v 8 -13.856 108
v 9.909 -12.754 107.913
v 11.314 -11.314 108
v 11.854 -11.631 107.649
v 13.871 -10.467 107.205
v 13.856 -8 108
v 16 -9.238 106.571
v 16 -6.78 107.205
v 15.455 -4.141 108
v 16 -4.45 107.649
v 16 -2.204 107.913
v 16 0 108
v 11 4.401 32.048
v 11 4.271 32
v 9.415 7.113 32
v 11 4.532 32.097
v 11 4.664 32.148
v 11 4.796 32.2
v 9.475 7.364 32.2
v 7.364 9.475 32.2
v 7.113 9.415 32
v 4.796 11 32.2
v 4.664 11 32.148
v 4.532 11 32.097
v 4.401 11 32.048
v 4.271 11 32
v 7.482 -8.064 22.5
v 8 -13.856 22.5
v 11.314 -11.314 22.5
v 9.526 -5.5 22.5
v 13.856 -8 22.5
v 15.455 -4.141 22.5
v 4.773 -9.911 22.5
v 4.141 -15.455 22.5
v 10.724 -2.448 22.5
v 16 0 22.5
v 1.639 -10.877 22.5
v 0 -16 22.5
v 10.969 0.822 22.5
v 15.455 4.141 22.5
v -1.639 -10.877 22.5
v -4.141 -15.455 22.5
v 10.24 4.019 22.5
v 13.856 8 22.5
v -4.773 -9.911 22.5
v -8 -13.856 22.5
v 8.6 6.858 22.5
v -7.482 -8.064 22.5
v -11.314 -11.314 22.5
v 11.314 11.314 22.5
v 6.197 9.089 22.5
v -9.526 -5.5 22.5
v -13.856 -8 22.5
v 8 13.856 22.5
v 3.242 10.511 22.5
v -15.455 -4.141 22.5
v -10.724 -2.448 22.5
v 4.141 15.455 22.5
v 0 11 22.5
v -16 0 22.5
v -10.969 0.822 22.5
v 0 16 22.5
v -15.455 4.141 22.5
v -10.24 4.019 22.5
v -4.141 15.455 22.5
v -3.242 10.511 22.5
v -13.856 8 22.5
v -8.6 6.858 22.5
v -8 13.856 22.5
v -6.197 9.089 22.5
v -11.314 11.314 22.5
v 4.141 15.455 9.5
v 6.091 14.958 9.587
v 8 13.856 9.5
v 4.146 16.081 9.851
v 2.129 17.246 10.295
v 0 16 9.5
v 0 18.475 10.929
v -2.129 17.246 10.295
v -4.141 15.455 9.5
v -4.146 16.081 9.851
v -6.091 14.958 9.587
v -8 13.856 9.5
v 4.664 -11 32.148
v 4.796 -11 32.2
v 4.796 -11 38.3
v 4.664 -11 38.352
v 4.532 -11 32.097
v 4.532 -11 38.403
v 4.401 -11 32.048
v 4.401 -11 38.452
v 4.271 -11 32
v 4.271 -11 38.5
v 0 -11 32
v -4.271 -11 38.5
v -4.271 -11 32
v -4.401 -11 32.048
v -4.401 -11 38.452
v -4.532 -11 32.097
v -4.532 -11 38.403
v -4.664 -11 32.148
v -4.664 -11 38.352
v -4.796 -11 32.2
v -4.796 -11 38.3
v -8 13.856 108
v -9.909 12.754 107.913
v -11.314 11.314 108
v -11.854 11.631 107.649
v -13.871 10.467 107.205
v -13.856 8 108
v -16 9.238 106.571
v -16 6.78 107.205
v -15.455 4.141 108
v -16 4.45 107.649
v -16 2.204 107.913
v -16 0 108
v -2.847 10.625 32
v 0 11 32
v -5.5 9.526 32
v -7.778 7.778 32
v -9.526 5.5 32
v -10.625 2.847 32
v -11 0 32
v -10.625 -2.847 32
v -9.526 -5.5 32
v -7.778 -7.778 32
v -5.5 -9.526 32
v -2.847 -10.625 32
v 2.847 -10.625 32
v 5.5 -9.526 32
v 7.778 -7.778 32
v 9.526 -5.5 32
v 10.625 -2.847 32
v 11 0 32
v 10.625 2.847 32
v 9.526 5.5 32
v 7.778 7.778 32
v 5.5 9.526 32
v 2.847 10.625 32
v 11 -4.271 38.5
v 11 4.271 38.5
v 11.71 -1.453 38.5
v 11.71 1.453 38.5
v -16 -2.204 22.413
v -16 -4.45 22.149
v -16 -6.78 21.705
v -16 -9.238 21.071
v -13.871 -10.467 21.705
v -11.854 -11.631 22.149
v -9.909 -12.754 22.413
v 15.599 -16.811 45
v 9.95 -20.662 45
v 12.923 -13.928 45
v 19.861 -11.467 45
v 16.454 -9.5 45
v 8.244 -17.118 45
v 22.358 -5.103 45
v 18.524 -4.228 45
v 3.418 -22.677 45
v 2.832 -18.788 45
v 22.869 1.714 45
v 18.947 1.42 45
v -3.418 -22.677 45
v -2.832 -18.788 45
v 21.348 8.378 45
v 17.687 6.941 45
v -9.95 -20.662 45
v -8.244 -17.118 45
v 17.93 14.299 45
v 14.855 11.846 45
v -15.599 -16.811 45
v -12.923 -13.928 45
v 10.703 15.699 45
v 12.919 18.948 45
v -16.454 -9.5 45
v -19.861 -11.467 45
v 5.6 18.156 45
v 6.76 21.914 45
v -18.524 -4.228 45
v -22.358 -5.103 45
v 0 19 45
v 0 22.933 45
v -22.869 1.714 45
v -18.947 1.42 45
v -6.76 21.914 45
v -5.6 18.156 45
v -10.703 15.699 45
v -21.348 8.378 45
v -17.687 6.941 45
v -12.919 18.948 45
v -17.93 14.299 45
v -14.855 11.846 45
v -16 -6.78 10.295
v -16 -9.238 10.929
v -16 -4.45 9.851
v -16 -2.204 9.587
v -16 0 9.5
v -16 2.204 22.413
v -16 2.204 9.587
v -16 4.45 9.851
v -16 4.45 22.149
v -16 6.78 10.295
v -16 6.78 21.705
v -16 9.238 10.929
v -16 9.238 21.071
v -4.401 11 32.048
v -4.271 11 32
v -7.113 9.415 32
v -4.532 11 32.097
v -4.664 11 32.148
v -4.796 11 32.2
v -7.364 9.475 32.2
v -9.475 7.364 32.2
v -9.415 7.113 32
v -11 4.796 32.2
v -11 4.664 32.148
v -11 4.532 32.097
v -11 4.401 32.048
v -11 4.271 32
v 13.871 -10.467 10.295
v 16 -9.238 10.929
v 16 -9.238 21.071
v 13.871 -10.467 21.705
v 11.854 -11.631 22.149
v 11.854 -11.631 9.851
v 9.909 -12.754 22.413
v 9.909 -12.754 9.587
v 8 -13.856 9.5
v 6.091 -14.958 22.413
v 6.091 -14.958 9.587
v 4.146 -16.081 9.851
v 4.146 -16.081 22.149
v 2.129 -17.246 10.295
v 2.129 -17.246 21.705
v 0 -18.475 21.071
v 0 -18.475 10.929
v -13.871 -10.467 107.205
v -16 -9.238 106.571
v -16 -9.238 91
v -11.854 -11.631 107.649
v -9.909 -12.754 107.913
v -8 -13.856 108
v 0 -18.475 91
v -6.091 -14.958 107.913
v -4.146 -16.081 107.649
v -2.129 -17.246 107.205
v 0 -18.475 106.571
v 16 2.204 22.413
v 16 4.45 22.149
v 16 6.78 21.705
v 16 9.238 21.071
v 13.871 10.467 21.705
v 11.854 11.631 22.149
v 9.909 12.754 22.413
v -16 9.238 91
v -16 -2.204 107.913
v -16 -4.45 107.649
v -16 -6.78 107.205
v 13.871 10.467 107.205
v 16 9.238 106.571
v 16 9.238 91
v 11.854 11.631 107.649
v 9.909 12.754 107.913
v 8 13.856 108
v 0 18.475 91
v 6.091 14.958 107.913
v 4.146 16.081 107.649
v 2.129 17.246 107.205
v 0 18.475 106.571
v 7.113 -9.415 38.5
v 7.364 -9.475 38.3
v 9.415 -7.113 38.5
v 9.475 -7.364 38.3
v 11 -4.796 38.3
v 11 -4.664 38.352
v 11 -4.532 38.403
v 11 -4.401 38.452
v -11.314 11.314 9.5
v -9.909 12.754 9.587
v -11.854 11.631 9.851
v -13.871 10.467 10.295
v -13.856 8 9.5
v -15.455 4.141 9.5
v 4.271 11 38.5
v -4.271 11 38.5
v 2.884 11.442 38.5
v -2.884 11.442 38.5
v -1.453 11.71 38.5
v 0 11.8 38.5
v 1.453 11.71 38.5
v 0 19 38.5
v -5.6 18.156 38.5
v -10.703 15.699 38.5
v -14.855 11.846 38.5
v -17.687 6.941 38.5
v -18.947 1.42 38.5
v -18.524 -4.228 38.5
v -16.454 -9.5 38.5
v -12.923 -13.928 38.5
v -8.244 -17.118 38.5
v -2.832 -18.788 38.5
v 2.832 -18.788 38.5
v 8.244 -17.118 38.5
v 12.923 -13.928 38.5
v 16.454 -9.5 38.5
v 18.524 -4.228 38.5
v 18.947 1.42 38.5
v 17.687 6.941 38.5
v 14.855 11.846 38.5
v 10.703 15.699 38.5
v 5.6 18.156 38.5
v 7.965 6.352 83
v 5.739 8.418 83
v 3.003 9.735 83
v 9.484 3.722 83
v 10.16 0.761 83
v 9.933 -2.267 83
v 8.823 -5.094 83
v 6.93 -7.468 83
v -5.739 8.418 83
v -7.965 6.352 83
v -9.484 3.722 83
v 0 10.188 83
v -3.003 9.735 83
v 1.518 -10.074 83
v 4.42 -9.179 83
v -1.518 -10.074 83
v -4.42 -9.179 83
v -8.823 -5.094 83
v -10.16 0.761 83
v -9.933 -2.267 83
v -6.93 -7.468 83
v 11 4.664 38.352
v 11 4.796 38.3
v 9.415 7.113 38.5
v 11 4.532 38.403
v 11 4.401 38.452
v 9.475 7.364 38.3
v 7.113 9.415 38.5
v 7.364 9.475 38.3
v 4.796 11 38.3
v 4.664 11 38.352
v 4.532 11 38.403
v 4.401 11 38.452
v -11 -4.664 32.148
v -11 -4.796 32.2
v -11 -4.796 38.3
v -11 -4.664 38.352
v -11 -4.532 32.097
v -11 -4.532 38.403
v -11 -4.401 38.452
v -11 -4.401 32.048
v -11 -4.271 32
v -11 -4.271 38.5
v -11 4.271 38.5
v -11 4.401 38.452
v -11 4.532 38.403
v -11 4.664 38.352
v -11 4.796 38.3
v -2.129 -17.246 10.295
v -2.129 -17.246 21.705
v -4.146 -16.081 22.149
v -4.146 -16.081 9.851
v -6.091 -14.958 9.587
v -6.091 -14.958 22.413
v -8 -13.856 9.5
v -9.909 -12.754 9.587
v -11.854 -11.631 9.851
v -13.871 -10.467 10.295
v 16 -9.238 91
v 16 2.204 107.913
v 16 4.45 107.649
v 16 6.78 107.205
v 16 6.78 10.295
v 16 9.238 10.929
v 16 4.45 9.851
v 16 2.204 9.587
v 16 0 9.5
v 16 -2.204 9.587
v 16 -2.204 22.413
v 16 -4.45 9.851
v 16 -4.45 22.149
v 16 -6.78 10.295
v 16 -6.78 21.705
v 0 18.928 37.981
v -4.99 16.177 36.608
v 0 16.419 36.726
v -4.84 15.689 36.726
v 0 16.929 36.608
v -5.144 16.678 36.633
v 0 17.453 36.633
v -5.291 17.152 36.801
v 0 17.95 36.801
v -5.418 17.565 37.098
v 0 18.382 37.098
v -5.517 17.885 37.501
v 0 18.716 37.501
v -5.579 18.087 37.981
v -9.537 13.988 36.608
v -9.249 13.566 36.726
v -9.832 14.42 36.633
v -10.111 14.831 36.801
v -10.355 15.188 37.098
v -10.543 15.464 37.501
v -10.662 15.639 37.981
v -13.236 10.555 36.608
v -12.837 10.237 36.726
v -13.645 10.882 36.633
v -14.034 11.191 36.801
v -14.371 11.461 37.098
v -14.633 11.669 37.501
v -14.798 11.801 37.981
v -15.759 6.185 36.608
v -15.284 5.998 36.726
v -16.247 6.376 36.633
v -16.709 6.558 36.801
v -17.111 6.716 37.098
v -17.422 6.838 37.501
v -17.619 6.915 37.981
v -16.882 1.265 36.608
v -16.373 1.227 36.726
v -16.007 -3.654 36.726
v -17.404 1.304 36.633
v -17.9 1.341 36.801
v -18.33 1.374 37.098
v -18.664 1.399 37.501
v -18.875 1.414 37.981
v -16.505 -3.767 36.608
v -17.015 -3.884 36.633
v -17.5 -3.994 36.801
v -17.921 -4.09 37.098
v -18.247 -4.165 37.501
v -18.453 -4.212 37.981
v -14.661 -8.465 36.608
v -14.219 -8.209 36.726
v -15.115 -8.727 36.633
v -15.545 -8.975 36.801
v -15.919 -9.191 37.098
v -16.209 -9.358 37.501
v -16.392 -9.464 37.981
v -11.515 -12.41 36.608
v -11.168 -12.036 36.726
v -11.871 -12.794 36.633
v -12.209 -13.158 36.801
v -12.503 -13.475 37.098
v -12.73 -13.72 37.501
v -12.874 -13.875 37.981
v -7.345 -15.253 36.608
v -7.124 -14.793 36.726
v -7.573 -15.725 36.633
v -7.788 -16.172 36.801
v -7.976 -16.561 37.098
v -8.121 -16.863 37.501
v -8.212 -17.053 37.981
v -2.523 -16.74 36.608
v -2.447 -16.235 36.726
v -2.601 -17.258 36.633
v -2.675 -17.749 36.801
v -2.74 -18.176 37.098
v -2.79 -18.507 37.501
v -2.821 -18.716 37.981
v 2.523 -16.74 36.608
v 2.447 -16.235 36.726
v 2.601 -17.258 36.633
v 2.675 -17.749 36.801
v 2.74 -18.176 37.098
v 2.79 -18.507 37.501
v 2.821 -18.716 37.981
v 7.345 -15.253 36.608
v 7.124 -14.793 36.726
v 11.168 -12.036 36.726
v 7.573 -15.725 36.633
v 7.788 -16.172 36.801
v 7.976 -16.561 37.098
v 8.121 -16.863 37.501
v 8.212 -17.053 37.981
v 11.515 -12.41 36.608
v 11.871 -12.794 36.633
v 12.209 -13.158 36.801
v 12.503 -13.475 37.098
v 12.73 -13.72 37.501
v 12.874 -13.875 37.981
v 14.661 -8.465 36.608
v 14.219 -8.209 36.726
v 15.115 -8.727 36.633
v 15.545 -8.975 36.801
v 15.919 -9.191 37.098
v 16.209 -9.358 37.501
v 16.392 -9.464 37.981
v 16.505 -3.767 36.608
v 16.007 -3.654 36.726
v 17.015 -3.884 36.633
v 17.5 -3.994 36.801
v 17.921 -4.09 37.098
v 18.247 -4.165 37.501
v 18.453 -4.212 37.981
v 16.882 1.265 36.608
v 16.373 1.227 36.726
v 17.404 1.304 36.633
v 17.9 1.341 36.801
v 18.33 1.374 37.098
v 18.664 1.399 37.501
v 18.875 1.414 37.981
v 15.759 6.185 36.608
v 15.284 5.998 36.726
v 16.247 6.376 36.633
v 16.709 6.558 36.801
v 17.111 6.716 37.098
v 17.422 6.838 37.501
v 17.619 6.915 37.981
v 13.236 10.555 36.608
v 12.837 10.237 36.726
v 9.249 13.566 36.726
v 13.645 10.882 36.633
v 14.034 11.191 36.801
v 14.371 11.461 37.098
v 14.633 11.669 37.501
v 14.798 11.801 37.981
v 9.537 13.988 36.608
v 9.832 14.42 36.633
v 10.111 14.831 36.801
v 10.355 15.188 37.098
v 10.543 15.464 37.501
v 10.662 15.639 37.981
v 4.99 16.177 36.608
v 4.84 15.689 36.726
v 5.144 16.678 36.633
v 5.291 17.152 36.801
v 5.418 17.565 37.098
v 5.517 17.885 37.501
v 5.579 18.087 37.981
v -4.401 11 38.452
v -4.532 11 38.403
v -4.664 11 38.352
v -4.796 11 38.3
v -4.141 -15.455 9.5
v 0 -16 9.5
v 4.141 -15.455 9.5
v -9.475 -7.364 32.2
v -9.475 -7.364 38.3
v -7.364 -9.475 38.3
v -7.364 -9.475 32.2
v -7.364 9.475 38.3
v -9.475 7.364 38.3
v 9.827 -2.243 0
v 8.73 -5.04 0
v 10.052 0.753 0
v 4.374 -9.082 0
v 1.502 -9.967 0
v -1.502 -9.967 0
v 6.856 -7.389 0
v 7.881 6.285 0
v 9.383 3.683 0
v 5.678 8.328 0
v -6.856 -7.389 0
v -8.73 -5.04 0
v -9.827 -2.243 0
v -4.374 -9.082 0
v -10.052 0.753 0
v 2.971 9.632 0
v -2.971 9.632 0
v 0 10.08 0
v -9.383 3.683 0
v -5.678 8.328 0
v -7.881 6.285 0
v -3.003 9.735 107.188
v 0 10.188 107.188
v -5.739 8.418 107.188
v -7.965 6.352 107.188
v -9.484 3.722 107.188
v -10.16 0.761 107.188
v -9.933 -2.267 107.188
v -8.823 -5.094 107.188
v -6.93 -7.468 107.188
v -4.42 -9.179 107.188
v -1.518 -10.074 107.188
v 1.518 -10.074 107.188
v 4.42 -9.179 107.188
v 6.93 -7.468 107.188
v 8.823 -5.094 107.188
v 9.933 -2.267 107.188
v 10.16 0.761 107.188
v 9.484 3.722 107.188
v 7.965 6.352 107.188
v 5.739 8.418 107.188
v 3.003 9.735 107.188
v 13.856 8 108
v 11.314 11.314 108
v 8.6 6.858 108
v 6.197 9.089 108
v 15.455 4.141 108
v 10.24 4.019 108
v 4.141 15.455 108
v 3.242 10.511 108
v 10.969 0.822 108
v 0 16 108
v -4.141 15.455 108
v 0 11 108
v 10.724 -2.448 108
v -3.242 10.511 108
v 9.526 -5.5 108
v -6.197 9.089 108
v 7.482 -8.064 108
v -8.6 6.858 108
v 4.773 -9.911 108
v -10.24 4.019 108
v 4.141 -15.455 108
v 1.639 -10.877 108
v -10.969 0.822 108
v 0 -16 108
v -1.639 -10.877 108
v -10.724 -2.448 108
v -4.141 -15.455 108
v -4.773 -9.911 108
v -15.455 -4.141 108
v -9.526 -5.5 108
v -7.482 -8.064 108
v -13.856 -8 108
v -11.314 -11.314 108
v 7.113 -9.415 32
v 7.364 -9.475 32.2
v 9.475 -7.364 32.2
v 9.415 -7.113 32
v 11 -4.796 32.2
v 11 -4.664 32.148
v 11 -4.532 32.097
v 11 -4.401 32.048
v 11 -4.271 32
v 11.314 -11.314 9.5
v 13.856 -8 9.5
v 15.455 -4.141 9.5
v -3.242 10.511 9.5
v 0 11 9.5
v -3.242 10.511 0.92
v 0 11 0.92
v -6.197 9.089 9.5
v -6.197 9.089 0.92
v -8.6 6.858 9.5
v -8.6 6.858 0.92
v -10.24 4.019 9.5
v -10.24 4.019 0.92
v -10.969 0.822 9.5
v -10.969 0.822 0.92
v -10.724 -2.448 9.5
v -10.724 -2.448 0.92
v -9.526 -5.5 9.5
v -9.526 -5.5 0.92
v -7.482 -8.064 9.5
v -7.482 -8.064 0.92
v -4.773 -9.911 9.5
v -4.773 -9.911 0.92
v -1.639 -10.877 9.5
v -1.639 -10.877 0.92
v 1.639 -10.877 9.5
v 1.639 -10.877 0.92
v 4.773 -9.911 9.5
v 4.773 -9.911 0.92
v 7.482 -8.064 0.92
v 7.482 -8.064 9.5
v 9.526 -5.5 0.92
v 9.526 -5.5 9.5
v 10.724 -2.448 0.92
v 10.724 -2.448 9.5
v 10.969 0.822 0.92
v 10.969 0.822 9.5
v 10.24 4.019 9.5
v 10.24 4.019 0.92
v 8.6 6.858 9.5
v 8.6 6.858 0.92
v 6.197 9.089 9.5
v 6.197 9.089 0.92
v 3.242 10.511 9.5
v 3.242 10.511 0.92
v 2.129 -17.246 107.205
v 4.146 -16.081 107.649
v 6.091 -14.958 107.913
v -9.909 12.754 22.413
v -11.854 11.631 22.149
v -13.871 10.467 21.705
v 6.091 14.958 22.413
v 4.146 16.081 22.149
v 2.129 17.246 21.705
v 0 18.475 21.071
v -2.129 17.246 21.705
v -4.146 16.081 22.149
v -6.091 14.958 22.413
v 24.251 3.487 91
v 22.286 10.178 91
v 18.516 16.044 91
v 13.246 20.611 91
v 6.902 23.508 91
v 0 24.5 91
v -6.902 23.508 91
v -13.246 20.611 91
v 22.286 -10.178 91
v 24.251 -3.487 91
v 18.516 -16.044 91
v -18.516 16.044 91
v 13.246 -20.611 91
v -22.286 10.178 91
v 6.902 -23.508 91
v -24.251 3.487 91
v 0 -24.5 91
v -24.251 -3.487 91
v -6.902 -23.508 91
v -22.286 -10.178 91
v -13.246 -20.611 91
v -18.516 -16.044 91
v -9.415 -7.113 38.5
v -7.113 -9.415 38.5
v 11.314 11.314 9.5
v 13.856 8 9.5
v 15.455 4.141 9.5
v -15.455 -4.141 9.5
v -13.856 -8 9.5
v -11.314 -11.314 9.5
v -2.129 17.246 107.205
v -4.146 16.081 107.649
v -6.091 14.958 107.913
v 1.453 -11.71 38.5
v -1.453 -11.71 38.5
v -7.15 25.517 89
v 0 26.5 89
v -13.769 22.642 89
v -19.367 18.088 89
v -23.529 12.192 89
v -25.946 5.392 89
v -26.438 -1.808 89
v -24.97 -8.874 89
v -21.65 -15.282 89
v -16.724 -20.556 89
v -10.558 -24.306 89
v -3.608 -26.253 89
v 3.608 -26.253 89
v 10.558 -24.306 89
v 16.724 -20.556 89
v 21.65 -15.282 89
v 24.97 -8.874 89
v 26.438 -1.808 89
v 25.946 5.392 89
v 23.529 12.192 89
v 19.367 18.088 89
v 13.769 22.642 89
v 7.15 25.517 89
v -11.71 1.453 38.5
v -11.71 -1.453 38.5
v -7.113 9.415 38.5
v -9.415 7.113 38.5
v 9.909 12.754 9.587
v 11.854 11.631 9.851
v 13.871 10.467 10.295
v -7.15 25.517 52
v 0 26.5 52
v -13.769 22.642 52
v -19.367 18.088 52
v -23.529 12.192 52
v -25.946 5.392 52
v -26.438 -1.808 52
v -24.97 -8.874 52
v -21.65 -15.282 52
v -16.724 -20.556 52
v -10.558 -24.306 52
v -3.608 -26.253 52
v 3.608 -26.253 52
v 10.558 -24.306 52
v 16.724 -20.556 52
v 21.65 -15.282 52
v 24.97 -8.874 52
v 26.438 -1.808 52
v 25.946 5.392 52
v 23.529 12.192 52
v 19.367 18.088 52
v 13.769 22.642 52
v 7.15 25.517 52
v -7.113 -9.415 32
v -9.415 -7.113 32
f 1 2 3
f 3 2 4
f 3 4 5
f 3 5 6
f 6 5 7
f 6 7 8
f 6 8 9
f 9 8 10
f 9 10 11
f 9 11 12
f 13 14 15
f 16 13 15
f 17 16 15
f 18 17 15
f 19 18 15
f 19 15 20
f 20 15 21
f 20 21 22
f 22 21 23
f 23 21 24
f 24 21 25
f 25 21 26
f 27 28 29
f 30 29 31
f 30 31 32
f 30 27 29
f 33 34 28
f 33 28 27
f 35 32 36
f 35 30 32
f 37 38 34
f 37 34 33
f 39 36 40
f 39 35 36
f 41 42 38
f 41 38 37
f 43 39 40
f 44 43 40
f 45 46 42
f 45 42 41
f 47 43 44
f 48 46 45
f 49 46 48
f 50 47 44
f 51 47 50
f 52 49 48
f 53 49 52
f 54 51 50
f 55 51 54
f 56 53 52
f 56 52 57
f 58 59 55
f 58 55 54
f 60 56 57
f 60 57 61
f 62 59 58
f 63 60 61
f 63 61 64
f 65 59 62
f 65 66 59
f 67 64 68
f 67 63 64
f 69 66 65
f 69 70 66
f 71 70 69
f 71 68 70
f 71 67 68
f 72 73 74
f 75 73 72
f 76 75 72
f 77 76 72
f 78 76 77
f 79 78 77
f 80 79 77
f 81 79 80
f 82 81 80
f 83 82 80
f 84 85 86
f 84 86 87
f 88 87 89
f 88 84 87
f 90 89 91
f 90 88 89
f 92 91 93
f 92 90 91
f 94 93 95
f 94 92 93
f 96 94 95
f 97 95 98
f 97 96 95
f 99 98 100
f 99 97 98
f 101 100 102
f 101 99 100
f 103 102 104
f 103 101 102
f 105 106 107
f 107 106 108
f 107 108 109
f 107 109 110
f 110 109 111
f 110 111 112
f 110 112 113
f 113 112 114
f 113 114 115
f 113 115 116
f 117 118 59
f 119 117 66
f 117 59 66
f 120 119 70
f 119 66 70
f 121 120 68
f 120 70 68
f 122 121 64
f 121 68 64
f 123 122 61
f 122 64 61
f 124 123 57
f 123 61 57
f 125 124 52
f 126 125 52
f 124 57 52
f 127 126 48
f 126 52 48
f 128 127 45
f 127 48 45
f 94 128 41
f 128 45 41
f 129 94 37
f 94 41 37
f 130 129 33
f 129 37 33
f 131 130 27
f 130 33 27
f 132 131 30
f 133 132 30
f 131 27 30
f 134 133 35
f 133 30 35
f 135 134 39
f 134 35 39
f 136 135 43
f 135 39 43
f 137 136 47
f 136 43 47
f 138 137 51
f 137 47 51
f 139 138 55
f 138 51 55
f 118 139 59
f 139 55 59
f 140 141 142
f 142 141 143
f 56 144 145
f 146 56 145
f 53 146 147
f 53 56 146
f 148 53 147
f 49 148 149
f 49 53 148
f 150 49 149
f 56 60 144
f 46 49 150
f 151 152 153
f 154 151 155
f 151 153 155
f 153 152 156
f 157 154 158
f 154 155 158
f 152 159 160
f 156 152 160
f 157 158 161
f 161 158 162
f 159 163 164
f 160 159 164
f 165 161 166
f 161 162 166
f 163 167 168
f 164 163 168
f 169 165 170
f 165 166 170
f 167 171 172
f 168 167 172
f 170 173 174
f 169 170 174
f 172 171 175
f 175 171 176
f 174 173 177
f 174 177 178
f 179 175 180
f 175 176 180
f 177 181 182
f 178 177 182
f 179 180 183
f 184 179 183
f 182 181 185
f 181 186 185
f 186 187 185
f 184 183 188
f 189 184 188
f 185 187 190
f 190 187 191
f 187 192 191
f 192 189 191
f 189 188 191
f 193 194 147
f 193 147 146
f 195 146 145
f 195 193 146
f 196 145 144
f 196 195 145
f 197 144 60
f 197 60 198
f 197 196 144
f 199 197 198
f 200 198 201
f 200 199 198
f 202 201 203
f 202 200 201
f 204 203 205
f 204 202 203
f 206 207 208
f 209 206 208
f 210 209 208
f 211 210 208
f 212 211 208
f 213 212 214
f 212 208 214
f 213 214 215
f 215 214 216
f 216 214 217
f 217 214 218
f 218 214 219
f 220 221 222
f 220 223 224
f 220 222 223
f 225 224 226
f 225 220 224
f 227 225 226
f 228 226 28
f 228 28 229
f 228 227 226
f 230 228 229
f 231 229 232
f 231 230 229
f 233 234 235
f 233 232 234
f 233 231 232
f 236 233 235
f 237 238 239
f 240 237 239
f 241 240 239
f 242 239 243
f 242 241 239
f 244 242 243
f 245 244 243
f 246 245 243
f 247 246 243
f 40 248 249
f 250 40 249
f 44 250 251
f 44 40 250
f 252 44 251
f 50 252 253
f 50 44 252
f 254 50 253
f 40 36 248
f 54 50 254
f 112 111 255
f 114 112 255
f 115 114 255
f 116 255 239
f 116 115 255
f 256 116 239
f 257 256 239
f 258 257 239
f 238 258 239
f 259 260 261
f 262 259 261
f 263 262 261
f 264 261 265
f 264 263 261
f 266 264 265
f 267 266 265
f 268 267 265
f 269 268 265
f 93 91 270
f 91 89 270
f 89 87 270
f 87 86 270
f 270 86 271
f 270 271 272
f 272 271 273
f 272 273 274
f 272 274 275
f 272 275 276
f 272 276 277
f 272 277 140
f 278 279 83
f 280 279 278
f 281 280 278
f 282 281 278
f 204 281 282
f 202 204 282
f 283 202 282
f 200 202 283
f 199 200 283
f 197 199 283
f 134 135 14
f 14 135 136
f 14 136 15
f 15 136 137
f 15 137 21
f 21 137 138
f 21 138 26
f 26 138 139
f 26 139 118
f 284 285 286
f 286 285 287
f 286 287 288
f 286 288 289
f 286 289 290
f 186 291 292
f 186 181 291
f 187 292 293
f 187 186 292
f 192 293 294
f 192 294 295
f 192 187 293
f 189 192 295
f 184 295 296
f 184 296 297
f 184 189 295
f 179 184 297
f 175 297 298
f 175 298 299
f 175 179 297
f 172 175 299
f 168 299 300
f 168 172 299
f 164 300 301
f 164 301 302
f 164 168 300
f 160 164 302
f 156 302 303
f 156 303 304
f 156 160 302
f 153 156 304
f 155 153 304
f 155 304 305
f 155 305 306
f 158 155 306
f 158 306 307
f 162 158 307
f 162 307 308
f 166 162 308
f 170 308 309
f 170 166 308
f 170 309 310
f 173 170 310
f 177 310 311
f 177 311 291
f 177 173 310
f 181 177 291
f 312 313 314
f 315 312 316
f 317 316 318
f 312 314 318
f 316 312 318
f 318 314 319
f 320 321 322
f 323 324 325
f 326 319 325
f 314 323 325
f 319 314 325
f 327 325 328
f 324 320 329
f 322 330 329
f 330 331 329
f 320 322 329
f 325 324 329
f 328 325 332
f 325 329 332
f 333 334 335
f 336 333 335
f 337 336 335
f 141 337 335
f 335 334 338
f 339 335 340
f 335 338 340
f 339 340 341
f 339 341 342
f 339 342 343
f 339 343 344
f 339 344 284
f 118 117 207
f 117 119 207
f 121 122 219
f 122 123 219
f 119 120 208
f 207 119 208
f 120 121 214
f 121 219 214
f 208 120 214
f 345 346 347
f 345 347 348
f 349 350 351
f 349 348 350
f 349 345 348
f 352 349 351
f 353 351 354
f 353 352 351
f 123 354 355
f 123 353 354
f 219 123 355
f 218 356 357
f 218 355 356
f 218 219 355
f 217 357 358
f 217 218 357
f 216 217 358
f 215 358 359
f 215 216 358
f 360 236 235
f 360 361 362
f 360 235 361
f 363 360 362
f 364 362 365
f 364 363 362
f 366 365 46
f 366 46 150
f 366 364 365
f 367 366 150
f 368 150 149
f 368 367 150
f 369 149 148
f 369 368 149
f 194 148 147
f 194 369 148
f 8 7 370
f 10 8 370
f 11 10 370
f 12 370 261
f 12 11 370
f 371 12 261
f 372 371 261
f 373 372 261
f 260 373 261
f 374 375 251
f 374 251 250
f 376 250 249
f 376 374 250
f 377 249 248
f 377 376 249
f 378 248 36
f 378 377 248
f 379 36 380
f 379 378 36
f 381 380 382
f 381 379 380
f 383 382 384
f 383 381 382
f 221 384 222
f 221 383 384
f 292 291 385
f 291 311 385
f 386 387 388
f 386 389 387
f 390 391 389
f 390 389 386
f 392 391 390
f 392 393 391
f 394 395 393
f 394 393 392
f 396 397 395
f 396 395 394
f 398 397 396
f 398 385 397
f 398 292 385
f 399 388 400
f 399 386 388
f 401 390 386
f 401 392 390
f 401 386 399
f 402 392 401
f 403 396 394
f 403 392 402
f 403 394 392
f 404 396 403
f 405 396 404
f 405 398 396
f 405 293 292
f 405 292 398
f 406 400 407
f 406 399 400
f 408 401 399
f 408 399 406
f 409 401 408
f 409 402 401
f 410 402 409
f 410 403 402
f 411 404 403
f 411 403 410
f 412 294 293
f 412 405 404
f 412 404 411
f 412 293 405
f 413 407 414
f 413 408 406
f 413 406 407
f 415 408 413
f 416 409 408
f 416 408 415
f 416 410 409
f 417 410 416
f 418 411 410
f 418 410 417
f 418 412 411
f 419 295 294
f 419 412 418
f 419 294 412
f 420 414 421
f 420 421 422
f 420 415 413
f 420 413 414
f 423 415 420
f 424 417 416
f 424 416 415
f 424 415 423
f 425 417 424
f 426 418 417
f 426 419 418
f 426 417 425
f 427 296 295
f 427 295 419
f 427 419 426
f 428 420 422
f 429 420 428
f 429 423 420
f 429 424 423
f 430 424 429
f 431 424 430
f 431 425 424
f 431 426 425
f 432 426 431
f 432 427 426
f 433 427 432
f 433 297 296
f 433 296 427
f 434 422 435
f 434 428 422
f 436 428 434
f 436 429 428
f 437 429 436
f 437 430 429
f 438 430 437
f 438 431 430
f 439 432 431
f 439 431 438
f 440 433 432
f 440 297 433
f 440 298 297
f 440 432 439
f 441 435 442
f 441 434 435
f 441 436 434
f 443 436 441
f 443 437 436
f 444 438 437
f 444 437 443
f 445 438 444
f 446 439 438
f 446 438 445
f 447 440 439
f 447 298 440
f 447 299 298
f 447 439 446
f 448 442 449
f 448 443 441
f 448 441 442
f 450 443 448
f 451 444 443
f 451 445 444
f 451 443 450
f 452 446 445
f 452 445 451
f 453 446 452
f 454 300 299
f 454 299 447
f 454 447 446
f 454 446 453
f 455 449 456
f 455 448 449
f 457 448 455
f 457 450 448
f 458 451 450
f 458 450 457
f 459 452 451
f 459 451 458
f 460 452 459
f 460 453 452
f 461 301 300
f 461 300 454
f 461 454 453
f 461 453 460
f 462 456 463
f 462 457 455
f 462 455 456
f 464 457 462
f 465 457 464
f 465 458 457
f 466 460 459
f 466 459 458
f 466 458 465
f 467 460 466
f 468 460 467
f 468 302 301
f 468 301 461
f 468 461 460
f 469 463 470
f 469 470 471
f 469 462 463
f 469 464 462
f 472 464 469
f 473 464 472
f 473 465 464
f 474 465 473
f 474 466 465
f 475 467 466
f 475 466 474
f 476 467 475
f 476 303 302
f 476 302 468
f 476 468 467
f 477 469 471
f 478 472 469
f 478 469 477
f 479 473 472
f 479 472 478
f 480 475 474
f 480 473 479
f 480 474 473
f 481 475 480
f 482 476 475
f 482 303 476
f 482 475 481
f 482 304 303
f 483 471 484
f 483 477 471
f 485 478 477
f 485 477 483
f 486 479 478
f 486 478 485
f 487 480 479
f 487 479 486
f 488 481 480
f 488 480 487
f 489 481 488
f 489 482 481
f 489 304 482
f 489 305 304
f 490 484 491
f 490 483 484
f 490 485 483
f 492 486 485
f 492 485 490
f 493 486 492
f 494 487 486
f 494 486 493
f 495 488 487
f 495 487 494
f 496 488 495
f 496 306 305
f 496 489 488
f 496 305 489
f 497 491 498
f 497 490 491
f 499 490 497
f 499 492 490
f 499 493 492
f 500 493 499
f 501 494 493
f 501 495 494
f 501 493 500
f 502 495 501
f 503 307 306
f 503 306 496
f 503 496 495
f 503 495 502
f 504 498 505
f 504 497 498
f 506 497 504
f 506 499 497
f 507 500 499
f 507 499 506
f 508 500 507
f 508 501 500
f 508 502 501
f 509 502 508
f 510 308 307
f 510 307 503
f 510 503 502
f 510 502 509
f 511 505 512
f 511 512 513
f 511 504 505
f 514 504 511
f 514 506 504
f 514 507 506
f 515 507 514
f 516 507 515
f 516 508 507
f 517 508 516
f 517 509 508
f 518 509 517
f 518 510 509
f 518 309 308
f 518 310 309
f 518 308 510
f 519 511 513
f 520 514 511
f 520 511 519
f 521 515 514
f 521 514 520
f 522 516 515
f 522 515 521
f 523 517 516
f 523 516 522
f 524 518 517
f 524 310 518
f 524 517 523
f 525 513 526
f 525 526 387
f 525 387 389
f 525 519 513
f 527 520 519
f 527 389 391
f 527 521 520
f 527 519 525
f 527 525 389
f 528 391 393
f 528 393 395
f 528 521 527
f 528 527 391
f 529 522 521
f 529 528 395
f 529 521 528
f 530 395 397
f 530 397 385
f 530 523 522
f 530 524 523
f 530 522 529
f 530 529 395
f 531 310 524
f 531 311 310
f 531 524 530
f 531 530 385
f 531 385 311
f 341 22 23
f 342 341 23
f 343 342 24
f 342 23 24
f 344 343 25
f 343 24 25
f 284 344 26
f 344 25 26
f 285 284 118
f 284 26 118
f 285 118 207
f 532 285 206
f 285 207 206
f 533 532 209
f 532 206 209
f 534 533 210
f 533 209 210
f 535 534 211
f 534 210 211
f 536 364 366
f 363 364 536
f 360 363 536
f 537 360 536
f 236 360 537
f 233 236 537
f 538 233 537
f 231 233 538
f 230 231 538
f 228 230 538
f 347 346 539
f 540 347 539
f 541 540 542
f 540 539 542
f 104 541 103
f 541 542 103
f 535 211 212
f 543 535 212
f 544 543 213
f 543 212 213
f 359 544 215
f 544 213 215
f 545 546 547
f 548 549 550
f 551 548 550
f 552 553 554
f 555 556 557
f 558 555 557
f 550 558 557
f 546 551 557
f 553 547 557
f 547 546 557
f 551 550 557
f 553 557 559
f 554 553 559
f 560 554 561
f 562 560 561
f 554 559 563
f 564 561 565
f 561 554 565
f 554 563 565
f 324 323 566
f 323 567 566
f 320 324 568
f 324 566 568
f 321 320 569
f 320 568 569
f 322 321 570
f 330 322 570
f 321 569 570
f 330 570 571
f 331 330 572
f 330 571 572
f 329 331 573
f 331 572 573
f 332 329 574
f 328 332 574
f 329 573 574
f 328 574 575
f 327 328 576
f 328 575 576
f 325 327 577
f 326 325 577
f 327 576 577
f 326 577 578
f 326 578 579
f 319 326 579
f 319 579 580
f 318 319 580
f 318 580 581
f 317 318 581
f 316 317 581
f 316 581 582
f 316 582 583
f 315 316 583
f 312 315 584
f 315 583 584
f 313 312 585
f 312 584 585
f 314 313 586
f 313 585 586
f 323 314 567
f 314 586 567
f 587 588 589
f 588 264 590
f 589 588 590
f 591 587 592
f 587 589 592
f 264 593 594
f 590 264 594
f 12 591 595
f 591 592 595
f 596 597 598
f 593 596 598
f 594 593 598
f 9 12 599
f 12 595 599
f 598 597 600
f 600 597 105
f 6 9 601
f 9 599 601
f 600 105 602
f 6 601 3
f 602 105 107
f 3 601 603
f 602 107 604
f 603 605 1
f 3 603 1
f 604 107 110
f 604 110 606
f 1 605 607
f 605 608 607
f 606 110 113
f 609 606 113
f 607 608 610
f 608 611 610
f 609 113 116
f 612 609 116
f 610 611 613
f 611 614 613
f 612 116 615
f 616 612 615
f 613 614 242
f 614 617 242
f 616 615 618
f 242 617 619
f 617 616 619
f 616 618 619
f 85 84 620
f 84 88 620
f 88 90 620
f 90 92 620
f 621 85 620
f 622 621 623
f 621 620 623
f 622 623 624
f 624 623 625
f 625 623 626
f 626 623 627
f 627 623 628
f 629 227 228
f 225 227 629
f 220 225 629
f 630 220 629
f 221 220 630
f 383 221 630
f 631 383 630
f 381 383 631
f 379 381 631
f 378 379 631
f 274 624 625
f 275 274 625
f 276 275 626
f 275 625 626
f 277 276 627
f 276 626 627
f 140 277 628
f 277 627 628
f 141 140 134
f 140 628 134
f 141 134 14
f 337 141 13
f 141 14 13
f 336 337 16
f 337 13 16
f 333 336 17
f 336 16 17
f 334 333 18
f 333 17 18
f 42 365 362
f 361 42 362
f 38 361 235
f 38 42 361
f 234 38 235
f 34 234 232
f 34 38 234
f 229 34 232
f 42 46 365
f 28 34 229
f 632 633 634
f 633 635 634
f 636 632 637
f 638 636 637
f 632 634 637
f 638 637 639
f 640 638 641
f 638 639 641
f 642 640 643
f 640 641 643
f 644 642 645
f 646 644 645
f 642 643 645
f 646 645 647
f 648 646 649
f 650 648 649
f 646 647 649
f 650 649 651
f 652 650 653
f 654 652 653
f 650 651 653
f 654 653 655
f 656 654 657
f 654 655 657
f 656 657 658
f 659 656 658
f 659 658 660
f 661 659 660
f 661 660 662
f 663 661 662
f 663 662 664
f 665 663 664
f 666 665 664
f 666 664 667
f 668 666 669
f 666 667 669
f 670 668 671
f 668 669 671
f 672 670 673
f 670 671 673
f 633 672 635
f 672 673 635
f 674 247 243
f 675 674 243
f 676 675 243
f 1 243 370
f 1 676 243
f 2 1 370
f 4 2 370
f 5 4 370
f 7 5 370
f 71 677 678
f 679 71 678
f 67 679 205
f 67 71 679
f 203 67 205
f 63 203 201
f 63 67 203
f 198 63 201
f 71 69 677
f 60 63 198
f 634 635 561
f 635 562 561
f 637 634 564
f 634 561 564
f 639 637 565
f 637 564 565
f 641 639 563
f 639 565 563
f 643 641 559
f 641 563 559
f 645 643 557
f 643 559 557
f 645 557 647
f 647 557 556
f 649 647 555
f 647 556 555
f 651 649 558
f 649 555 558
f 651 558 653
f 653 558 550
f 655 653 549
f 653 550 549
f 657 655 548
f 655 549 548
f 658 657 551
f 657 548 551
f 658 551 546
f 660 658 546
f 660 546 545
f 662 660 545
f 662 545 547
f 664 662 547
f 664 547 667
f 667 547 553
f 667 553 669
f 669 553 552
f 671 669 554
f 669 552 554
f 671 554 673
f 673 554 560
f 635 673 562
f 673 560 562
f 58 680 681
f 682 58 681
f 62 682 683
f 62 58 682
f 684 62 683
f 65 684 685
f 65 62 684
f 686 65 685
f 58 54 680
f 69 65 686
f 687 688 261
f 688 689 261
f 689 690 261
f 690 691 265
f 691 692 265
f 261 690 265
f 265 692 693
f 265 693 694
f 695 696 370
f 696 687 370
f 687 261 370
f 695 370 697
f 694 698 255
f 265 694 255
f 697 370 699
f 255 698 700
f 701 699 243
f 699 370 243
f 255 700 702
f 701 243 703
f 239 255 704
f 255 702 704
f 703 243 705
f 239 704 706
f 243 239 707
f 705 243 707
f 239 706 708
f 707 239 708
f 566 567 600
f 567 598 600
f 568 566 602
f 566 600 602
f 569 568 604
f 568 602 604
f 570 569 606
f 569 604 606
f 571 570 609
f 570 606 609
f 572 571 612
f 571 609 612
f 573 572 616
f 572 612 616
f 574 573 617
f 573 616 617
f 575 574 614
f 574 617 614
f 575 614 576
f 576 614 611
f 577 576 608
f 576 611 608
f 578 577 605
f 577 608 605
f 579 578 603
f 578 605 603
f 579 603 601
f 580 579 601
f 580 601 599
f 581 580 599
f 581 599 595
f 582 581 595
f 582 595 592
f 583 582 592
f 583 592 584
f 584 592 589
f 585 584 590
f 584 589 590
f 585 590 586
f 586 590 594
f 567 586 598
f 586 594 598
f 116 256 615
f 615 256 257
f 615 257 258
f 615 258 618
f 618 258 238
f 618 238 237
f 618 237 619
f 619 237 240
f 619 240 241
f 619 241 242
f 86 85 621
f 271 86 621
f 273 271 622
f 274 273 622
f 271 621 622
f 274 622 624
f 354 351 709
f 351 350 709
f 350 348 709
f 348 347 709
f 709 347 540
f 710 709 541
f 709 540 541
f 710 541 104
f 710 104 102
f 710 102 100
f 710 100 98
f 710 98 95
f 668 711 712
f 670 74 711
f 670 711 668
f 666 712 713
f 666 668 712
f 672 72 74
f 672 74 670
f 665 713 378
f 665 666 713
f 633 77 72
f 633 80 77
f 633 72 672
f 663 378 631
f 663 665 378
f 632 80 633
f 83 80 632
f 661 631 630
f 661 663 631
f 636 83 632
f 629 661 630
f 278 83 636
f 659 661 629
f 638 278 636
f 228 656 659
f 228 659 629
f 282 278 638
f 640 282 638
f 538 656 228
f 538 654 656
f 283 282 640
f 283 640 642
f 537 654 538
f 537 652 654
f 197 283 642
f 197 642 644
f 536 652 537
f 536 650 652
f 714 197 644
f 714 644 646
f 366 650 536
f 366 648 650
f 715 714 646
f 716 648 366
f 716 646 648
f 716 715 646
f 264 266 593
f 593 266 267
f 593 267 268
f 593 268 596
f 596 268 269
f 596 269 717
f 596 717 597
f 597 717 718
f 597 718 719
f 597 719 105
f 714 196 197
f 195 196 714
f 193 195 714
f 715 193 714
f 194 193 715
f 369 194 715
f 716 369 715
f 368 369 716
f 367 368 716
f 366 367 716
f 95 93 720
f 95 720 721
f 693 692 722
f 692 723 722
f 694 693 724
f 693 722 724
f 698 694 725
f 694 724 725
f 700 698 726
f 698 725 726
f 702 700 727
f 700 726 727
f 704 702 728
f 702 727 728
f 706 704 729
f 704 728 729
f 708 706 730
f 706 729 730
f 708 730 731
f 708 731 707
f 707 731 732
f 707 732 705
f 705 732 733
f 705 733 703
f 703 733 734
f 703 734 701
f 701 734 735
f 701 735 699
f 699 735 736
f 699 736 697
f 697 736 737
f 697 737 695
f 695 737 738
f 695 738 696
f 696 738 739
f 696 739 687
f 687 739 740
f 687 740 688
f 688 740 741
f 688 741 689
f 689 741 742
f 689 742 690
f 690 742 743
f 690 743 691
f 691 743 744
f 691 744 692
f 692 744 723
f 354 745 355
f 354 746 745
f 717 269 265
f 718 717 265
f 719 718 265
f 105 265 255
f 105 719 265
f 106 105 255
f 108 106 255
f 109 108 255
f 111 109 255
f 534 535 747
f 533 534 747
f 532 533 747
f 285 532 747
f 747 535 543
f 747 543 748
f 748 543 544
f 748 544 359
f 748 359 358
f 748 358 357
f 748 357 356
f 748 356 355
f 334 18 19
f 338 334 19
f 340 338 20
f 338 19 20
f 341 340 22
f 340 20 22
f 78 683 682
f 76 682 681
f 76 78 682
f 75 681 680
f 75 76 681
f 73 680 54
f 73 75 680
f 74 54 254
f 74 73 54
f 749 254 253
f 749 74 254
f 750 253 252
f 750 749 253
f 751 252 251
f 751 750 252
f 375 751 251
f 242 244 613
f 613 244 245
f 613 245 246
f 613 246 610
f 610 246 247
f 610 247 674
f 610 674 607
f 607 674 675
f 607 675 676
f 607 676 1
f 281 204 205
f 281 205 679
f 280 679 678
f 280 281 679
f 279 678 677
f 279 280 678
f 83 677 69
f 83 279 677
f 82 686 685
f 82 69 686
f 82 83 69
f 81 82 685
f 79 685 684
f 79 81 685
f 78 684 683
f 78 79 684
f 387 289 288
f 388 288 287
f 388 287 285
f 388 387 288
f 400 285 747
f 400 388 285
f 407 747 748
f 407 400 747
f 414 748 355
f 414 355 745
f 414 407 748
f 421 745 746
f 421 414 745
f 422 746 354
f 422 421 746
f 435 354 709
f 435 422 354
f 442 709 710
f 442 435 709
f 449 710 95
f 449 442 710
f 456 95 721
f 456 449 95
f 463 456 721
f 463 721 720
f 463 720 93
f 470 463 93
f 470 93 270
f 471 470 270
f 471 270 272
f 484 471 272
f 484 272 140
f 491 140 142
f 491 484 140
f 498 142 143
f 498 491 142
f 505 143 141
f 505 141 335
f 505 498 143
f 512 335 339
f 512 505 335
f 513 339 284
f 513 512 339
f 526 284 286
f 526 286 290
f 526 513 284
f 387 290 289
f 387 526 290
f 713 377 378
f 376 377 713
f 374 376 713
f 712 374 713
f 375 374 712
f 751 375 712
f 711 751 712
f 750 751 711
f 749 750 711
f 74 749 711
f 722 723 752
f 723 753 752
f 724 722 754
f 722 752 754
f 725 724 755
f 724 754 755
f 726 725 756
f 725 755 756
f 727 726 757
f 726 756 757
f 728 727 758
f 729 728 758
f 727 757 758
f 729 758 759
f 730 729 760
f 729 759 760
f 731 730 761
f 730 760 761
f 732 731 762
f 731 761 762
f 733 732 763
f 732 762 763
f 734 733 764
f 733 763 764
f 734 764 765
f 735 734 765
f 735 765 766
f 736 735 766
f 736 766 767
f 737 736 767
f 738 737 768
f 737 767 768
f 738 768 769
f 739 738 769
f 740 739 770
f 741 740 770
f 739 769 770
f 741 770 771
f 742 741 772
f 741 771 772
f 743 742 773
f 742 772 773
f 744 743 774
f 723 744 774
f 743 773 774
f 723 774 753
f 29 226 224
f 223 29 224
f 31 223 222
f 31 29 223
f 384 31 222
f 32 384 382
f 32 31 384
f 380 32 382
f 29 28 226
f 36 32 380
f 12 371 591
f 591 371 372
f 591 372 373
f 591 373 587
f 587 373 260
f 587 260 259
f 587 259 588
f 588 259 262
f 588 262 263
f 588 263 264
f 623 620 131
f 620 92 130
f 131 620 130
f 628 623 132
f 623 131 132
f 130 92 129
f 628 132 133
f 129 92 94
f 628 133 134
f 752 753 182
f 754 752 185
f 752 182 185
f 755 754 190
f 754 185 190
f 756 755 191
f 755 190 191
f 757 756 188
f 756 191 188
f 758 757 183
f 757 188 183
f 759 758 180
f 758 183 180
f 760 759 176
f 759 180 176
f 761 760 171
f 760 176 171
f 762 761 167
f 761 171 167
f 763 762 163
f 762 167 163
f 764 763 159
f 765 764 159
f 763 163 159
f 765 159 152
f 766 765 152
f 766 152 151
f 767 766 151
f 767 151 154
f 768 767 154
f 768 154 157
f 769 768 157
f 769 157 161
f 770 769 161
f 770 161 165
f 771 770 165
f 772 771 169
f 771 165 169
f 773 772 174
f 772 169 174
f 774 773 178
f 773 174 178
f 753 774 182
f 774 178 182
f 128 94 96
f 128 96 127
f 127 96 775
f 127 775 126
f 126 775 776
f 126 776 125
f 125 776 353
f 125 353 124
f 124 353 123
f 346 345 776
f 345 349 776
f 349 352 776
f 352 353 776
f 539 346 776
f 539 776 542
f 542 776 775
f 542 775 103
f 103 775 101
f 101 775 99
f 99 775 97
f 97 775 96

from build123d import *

# Parameters (mm, degrees)
SKETCH_2_R          = 33
SKETCH_2_W          = 44
SKETCH_2_H          = 22
CUT_EXTRUDE_1_DEPTH = 6.5
SKETCH_3_R          = 33
SKETCH_3_W          = 22
SKETCH_3_H          = 44
CUT_EXTRUDE_2_DEPTH = 6.5
SKETCH_5_R          = 32
CUT_EXTRUDE_3_DEPTH = 17
SKETCH_7_R          = 32
CUT_EXTRUDE_4_DEPTH = 13


with BuildPart() as part:
    # 草图1 → 旋转1 (revolve)
    with BuildSketch(Plane(origin=(0, 0, 0), x_dir=(0, 0, -1), z_dir=(1, 0, 0))):
        Polygon((-83, 0), (-83, 10.188), (-107.188, 10.188), (-108, 11), (-108, 16), (-106.57093764, 18.475208614), (-91.6, 18.475208614), (-91, 19.075208614), (-91, 24.5), (-89, 26.5), (-52, 26.5), (-45, 22.933321854), (-45, 10.5), (-38.5, 10.5), (-38.5, 11.8), (-38.3, 12), (-32.2, 12), (-32, 11.8), (-32, 11), (-0.92, 11), (0, 10.08), (0, 0), align=None)
    revolve(axis=Axis((0, 0, 0), (0, 0, 1)))

    # 草图2 → 切除-拉伸1 (cut)
    with BuildSketch(Plane(origin=(0, 0, 32), x_dir=(-1, 0, 0), z_dir=(0, 0, -1))):
        Circle(SKETCH_2_R)
        Rectangle(SKETCH_2_W, SKETCH_2_H, mode=Mode.SUBTRACT)
    extrude(amount=-CUT_EXTRUDE_1_DEPTH, mode=Mode.SUBTRACT)

    # 草图3 → 切除-拉伸2 (cut)
    with BuildSketch(Plane(origin=(0, 0, 32), x_dir=(-1, 0, 0), z_dir=(0, 0, -1))):
        Circle(SKETCH_3_R)
        Rectangle(SKETCH_3_W, SKETCH_3_H, mode=Mode.SUBTRACT)
    extrude(amount=-CUT_EXTRUDE_2_DEPTH, mode=Mode.SUBTRACT)

    # 草图4 → 旋转2 (revolve)
    with BuildSketch(Plane(origin=(0, 0, 0), x_dir=(0, 0, -1), z_dir=(1, 0, 0))):
        with BuildLine():
            Line((-45, 19), (-45, 10.5))
            Line((-45, 10.5), (-38.5, 10.5))
            Line((-38.5, 10.5), (-38.5, 11.8))
            Line((-38.5, 11.8), (-36.726286637, 16.418867925))
            ThreePointArc((-36.726286637, 16.418867925), (-36.934089571, 18.176069017), (-38.5, 19))
            Line((-38.5, 19), (-45, 19))
        make_face()
    revolve(axis=Axis((0, 0, -50), (0, 0, 1)))

    # 草图5 → 切除-拉伸3 (cut)
    with BuildSketch(Plane.XY.offset(108)):
        Circle(SKETCH_5_R)
        Polygon((0, -18.475208614), (16, -9.237604307), (16, 9.237604307), (0, 18.475208614), (-16, 9.237604307), (-16, -9.237604307), align=None, mode=Mode.SUBTRACT)
    extrude(amount=-CUT_EXTRUDE_3_DEPTH, mode=Mode.SUBTRACT)

    # 草图6 → 旋转3 (revolve)
    with BuildSketch(Plane(origin=(0, 0, 0), x_dir=(0, 0, -1), z_dir=(1, 0, 0))):
        Polygon((-22.5, 16), (-22.5, 11), (-21.688, 10.188), (-10.312, 10.188), (-9.5, 11), (-9.5, 16), (-10.92906236, 18.475208614), (-21.07093764, 18.475208614), align=None)
    revolve(axis=Axis((0, 0, 9.5), (0, 0, 1)))

    # 草图7 → 切除-拉伸4 (cut)
    with BuildSketch(Plane(origin=(0, 0, 9.5), x_dir=(-1, 0, 0), z_dir=(0, 0, -1))):
        Circle(SKETCH_7_R)
        Polygon((0, -18.475208614), (16, -9.237604307), (16, 9.237604307), (0, 18.475208614), (-16, 9.237604307), (-16, -9.237604307), align=None, mode=Mode.SUBTRACT)
    extrude(amount=-CUT_EXTRUDE_4_DEPTH, mode=Mode.SUBTRACT)


solid = part.part
